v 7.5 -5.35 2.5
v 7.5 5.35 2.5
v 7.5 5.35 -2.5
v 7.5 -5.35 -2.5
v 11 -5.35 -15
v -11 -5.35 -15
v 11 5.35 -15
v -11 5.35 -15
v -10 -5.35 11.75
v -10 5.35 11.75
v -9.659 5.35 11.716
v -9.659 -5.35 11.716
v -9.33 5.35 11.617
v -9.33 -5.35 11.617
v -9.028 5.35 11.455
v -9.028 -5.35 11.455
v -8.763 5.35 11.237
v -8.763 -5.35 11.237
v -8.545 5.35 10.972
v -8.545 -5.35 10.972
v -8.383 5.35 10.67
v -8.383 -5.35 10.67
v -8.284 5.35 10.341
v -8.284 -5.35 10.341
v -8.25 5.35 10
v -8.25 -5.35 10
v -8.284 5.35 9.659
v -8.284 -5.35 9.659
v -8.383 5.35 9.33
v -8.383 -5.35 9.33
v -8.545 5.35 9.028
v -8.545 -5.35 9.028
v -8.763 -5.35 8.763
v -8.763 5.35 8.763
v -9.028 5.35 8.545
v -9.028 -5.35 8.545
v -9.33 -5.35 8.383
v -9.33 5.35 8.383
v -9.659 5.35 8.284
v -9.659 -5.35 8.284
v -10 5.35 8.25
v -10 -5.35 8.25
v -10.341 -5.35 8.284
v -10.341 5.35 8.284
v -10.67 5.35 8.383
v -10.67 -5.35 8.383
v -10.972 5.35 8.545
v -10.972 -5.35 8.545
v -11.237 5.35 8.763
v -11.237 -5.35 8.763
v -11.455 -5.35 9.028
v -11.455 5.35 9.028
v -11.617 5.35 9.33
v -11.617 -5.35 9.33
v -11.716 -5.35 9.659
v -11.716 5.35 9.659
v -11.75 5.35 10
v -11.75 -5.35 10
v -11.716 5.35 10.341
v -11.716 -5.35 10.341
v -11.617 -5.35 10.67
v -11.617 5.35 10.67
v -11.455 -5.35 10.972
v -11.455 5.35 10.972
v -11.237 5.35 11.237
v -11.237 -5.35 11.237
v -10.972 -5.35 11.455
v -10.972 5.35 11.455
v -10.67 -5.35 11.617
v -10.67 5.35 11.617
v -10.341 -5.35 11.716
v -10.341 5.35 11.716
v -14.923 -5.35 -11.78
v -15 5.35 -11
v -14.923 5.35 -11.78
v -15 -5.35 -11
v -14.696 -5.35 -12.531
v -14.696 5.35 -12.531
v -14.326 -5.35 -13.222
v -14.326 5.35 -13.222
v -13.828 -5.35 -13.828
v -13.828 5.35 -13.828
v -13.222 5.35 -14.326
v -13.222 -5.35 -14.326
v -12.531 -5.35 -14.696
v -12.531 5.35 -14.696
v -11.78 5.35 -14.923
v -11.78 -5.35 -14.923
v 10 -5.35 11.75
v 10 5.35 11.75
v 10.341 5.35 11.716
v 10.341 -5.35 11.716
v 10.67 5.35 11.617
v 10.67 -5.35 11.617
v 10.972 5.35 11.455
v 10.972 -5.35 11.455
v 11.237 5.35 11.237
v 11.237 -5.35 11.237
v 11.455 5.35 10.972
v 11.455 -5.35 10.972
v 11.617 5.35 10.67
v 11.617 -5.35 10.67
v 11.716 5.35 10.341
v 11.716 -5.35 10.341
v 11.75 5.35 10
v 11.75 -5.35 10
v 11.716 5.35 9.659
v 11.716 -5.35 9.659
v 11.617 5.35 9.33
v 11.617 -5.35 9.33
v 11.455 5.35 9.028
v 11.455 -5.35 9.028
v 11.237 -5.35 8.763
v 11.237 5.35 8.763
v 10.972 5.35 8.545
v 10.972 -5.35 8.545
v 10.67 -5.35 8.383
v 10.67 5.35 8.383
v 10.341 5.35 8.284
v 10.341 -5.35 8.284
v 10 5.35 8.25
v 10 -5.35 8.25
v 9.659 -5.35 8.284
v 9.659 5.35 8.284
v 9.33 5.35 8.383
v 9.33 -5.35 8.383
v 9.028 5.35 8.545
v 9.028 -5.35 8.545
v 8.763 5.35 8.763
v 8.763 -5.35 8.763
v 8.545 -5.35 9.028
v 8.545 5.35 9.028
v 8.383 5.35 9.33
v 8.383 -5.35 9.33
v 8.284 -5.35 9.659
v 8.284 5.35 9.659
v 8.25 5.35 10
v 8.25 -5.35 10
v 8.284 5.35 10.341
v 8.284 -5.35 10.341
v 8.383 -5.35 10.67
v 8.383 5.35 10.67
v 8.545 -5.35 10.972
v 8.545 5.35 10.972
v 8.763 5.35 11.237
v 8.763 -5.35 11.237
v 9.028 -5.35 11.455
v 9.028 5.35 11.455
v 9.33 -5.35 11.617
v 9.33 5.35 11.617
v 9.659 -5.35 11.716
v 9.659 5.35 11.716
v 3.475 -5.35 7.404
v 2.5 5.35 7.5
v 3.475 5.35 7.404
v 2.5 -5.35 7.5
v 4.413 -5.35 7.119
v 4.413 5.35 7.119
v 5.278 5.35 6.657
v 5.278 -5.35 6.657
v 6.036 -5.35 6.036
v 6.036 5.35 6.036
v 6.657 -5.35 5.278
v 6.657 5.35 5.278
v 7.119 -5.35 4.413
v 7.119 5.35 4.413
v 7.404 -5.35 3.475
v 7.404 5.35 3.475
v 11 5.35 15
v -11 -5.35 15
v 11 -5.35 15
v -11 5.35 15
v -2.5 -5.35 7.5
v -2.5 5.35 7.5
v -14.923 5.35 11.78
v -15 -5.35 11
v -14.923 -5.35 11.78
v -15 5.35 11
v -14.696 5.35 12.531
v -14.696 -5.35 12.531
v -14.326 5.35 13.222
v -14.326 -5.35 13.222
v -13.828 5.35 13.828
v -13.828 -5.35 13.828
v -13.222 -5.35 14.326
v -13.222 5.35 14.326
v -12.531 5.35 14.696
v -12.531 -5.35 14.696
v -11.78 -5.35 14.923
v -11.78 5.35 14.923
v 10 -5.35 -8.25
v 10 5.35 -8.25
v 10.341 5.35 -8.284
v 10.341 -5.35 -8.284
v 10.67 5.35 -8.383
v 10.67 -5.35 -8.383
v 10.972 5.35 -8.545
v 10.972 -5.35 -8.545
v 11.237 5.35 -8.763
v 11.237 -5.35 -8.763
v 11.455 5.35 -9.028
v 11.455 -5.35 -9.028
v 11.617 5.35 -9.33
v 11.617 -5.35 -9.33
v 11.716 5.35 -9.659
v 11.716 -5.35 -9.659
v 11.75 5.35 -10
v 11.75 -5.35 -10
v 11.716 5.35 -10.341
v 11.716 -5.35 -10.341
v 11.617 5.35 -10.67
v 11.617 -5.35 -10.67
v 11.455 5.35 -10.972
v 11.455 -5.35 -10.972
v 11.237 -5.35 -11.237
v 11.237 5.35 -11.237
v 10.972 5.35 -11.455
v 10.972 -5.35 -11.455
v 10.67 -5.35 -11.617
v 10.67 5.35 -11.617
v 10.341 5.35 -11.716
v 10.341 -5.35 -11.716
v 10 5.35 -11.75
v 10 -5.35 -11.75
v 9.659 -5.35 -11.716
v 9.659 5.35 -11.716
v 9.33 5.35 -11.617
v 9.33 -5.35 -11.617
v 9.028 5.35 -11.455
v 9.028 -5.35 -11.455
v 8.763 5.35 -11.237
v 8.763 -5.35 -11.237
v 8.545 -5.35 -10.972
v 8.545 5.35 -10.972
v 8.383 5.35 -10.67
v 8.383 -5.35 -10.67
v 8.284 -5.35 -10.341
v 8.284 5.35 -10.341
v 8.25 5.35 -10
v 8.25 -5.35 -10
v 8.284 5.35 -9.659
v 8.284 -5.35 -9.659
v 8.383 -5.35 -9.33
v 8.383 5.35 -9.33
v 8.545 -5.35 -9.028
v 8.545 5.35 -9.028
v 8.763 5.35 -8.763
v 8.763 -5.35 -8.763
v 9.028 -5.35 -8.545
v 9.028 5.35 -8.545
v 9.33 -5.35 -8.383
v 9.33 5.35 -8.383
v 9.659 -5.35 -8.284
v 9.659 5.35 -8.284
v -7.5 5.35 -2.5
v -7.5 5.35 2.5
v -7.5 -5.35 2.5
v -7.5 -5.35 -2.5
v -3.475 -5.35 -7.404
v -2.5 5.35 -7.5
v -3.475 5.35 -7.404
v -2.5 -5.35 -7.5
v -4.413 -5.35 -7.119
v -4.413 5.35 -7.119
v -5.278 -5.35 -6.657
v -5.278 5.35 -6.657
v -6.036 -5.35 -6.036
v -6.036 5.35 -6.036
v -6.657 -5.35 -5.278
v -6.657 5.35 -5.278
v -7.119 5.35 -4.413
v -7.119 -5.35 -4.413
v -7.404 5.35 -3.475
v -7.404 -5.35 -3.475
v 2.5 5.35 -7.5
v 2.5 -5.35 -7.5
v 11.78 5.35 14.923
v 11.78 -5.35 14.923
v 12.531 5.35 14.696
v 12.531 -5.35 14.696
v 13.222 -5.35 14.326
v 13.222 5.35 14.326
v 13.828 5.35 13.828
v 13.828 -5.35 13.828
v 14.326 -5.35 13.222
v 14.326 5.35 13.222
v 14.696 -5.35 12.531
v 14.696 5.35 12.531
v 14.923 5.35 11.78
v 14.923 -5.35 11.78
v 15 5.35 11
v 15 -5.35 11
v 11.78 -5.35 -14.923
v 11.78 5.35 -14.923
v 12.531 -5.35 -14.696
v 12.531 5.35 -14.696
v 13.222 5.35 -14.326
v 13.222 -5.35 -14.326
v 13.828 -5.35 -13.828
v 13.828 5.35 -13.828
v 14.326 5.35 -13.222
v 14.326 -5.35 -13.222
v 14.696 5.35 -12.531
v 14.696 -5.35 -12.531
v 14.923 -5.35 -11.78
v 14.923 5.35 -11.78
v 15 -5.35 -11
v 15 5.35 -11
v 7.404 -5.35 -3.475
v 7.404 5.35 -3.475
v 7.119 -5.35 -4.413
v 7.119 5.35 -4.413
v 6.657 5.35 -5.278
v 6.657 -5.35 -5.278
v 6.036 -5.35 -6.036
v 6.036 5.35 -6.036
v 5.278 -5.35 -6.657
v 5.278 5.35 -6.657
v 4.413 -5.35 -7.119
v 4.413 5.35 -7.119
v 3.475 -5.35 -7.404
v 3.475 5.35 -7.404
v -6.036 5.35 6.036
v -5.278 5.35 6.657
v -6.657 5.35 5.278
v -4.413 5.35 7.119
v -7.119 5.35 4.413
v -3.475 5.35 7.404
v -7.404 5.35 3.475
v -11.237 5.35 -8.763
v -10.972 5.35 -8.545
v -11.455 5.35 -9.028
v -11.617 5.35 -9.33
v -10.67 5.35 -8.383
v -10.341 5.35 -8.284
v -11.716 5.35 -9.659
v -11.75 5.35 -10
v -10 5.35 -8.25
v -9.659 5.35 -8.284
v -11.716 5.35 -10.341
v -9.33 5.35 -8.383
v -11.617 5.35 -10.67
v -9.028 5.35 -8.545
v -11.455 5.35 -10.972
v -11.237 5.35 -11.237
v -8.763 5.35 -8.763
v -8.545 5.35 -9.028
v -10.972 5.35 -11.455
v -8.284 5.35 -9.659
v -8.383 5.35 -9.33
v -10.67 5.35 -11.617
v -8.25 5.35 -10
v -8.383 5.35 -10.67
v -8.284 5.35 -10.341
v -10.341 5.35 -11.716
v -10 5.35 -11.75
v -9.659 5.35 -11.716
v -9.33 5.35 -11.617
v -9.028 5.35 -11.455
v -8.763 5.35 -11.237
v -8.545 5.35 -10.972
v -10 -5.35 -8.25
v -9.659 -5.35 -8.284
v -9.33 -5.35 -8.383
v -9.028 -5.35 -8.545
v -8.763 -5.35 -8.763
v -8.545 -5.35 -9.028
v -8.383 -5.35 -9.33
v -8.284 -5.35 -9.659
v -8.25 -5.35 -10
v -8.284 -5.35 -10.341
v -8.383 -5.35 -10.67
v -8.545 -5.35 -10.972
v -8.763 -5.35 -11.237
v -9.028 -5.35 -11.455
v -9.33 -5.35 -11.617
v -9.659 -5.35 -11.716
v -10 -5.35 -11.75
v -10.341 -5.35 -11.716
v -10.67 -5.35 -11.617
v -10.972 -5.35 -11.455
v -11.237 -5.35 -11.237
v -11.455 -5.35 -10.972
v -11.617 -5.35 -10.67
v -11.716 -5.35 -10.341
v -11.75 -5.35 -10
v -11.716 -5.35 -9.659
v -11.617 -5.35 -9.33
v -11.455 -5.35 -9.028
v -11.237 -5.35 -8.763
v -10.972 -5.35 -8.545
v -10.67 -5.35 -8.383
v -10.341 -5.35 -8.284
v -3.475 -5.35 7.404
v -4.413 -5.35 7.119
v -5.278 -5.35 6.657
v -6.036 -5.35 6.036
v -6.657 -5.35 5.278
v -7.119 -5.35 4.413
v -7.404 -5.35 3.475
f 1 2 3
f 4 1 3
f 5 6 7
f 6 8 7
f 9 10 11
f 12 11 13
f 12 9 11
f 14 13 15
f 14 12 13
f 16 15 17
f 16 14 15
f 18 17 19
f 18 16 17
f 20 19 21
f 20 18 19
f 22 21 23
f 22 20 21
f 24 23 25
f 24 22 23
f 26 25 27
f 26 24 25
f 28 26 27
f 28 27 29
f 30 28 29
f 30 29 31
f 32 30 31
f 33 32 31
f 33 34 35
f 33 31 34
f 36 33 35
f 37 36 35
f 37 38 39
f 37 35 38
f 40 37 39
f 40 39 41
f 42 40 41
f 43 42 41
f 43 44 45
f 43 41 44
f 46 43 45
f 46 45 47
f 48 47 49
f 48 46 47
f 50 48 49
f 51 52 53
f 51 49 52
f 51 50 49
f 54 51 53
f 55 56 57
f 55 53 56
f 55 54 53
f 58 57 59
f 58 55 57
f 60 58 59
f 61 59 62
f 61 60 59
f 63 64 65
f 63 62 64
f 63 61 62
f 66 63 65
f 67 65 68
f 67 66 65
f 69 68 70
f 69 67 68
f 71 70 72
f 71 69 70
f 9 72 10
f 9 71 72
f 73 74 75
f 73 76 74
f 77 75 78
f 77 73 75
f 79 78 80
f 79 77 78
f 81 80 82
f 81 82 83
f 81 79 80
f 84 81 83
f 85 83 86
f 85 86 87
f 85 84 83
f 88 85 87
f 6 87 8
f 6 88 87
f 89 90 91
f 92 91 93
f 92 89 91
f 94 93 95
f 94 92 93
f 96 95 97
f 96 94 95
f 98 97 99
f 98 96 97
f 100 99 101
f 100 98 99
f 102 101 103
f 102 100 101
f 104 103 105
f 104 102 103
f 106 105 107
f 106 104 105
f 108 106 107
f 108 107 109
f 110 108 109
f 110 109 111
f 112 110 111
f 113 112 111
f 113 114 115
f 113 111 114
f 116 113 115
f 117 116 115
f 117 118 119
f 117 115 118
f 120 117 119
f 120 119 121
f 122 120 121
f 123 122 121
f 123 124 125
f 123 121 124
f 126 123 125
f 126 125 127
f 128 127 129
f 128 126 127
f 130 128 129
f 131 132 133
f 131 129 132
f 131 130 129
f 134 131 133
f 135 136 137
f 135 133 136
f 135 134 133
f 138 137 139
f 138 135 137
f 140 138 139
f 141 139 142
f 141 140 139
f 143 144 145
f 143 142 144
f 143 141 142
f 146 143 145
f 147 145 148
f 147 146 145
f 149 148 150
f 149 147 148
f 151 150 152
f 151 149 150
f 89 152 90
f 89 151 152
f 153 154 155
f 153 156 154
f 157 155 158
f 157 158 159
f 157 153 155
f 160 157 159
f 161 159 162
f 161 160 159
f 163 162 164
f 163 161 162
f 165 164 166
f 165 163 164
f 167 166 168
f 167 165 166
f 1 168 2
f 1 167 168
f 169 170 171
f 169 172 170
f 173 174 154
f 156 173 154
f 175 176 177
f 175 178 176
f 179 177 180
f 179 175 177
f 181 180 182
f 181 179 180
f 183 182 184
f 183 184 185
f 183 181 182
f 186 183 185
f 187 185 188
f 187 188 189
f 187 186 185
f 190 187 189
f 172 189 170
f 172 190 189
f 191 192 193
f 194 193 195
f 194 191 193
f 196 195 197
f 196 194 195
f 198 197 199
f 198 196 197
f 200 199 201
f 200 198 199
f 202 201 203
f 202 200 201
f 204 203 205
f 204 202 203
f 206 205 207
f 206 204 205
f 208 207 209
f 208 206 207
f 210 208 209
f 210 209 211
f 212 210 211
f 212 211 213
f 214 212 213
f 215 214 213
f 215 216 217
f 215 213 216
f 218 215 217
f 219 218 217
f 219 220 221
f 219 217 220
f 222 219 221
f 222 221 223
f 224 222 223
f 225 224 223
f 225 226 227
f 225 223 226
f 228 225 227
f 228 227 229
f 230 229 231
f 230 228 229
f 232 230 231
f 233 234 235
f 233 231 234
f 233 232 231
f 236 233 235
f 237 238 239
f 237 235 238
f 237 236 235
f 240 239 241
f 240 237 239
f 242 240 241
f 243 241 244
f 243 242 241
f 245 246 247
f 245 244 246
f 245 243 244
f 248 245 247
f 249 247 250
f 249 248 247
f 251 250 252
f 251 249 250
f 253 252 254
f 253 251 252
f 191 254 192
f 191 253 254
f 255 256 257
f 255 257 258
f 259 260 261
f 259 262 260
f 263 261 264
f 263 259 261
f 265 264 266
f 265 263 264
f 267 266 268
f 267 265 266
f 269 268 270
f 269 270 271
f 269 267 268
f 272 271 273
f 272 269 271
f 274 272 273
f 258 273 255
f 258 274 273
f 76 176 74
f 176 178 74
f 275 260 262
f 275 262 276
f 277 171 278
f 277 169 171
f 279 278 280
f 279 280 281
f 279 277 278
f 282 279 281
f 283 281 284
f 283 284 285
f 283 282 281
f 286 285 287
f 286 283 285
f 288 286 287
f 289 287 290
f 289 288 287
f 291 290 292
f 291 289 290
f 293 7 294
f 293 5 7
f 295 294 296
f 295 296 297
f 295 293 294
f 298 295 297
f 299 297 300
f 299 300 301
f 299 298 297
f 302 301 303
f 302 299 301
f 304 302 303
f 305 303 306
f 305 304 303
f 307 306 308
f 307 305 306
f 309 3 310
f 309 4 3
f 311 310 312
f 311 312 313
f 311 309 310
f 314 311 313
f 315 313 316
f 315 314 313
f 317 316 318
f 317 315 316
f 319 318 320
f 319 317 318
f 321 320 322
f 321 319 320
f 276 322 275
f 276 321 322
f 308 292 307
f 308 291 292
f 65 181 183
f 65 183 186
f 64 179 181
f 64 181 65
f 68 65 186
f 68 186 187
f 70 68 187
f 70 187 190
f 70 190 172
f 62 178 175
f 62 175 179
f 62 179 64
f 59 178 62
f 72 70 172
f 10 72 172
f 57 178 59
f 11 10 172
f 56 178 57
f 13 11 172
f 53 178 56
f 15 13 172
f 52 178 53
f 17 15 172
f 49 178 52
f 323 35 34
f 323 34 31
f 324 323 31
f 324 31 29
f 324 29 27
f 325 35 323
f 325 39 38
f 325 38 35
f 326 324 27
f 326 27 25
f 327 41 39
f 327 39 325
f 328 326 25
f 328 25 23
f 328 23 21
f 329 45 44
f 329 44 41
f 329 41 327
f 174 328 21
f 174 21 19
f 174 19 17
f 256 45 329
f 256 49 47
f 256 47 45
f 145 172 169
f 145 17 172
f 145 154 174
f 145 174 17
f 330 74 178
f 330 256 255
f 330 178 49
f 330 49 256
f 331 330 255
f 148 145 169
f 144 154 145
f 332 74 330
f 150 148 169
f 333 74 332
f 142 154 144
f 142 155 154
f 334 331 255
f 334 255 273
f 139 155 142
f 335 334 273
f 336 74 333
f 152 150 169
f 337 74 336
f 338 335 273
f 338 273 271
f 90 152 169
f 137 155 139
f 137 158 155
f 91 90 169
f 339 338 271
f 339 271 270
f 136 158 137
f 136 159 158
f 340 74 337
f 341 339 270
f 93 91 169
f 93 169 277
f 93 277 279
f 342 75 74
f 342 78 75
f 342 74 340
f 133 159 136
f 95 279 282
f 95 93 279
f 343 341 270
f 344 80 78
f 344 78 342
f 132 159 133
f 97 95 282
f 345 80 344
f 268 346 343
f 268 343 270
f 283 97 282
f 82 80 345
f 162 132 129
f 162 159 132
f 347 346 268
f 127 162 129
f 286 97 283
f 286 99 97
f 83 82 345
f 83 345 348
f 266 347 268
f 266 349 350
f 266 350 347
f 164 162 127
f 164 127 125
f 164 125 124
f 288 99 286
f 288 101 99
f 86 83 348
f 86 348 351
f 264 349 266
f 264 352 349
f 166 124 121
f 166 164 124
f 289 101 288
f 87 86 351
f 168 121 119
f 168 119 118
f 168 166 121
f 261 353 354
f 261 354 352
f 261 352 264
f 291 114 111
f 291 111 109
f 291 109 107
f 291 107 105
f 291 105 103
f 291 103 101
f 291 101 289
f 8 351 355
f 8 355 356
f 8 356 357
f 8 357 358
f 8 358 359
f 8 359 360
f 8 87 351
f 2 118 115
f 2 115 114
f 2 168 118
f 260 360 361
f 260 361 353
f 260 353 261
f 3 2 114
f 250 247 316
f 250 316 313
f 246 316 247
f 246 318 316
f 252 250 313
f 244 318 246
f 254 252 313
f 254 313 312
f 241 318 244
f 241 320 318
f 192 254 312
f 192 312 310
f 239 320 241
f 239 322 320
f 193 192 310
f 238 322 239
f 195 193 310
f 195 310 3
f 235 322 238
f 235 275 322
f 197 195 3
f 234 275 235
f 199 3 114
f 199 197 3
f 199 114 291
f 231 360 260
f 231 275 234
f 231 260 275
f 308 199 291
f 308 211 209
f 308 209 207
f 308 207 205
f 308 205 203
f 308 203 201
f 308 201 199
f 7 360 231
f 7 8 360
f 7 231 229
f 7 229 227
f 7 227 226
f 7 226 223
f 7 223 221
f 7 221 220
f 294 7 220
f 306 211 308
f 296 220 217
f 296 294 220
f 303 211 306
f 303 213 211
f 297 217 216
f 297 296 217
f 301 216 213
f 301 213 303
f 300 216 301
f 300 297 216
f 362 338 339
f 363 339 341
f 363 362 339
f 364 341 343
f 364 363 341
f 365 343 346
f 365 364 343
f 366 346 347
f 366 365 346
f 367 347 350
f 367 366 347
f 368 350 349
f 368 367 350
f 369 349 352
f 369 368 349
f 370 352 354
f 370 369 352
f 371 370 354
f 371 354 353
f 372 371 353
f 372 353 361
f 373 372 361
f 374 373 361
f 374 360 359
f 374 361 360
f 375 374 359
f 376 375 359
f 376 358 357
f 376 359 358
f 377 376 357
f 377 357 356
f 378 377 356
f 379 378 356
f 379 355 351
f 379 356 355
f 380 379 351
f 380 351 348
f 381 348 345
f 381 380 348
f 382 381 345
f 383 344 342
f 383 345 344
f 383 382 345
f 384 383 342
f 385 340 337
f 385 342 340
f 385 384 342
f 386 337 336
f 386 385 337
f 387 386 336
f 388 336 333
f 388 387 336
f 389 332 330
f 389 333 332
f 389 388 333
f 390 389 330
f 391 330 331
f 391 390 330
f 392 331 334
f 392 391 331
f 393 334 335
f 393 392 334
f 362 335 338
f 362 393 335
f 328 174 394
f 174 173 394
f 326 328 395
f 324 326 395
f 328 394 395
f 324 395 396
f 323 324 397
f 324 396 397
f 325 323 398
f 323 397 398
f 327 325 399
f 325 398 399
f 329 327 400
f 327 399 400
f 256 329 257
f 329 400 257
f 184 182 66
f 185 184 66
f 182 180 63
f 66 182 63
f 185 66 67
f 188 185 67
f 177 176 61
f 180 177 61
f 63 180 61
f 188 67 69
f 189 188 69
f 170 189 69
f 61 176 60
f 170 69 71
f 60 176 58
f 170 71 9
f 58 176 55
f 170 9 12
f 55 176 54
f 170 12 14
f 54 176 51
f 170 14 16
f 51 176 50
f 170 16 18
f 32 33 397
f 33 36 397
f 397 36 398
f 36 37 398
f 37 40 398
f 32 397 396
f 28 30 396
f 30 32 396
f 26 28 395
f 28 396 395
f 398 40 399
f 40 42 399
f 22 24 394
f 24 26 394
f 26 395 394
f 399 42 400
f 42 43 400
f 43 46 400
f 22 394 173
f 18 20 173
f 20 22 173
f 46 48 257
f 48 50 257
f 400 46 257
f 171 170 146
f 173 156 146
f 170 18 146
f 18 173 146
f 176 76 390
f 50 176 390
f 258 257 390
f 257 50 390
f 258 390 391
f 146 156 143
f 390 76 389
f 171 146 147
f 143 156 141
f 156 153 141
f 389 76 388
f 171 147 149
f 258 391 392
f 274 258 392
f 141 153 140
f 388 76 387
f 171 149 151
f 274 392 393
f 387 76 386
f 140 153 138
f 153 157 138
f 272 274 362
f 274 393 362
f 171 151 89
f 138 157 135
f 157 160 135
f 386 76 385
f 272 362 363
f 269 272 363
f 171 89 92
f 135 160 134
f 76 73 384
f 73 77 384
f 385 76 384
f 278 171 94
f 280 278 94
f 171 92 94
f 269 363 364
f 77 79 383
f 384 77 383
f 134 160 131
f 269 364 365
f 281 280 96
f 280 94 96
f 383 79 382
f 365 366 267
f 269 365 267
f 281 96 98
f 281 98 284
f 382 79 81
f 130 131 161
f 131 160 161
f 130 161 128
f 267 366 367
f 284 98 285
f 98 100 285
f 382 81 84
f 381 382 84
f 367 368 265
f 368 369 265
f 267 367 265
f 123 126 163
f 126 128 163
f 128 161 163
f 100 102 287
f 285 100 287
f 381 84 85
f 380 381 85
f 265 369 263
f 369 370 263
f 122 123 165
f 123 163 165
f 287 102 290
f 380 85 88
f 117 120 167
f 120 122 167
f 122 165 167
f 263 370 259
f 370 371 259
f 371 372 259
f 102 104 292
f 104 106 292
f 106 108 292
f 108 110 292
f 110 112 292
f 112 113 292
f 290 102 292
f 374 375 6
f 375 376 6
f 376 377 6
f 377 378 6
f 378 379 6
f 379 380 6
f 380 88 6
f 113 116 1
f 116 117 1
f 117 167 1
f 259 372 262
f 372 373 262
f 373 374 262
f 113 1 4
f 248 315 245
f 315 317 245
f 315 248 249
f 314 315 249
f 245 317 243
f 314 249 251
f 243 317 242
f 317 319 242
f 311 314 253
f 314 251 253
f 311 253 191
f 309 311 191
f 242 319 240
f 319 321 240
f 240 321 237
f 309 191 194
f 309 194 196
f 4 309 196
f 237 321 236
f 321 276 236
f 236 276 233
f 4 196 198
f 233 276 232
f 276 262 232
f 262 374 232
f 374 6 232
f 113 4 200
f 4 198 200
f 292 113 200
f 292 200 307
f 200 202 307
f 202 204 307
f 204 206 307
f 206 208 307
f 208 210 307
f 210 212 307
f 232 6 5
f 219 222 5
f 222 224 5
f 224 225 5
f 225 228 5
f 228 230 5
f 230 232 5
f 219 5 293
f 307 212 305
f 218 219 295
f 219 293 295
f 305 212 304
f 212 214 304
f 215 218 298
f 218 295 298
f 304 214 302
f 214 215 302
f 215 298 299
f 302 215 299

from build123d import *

# Parameters (mm, degrees)
SKETCH_1_W             = 30
SKETCH_1_H             = 30
EXTRUDE_398_DEPTH      = 5.35
SKETCH_2_R             = 1.75
CUT_EXTRUDE_618_DEPTH  = 24.758998295
SKETCH_4_W             = 15
SKETCH_4_H             = 15
CUT_EXTRUDE_1118_DEPTH = 24.758998295
FILLET_3_R             = 5
FILLET_6_R             = 4


with BuildPart() as part:
    # Эскиз1 → Extrude 398 (new, symmetric)
    with BuildSketch(Plane(origin=(0, 0, 0), x_dir=(1, 0, 0), z_dir=(0, 1, 0))):
        Rectangle(SKETCH_1_W, SKETCH_1_H)
    extrude(amount=EXTRUDE_398_DEPTH, both=True)

    # Эскиз2 → Cut-Extrude 618 (cut, through all)
    with BuildSketch(Plane(origin=(0, -5.35, 0), x_dir=(1, 0, 0), z_dir=(0, 1, 0))):
        with Locations(Location((-10, 10, 0), (0, 0, 270))):
            Circle(SKETCH_2_R)
        with Locations(Location((10, 10, 0), (0, 0, 270))):
            Circle(SKETCH_2_R)
        with Locations(Location((10, -10, 0), (0, 0, 270))):
            Circle(SKETCH_2_R)
        with Locations(Location((-10, -10, 0), (0, 0, 270))):
            Circle(SKETCH_2_R)
    extrude(amount=CUT_EXTRUDE_618_DEPTH, mode=Mode.SUBTRACT)

    # Эскиз4 → Cut-Extrude 1118 (cut, through all)
    with BuildSketch(Plane(origin=(0, 5.35, 0), x_dir=(1, 0, 0), z_dir=(0, 1, 0))):
        Rectangle(SKETCH_4_W, SKETCH_4_H)
    extrude(amount=-CUT_EXTRUDE_1118_DEPTH, mode=Mode.SUBTRACT)

    # Скругление3
    fillet_3_edges = [part.edges().sort_by_distance(p)[0] for p in [
        (-7.5, 0, 7.5),
        (-7.5, 0, -7.5),
        (7.5, 0, -7.5),
        (7.5, 0, 7.5),
    ]]
    fillet(fillet_3_edges, radius=FILLET_3_R)

    # Скругление6
    fillet_6_edges = [part.edges().sort_by_distance(p)[0] for p in [
        (15, 0, 15),
        (-15, 0, 15),
        (-15, 0, -15),
        (15, 0, -15),
    ]]
    fillet(fillet_6_edges, radius=FILLET_6_R)


solid = part.part
